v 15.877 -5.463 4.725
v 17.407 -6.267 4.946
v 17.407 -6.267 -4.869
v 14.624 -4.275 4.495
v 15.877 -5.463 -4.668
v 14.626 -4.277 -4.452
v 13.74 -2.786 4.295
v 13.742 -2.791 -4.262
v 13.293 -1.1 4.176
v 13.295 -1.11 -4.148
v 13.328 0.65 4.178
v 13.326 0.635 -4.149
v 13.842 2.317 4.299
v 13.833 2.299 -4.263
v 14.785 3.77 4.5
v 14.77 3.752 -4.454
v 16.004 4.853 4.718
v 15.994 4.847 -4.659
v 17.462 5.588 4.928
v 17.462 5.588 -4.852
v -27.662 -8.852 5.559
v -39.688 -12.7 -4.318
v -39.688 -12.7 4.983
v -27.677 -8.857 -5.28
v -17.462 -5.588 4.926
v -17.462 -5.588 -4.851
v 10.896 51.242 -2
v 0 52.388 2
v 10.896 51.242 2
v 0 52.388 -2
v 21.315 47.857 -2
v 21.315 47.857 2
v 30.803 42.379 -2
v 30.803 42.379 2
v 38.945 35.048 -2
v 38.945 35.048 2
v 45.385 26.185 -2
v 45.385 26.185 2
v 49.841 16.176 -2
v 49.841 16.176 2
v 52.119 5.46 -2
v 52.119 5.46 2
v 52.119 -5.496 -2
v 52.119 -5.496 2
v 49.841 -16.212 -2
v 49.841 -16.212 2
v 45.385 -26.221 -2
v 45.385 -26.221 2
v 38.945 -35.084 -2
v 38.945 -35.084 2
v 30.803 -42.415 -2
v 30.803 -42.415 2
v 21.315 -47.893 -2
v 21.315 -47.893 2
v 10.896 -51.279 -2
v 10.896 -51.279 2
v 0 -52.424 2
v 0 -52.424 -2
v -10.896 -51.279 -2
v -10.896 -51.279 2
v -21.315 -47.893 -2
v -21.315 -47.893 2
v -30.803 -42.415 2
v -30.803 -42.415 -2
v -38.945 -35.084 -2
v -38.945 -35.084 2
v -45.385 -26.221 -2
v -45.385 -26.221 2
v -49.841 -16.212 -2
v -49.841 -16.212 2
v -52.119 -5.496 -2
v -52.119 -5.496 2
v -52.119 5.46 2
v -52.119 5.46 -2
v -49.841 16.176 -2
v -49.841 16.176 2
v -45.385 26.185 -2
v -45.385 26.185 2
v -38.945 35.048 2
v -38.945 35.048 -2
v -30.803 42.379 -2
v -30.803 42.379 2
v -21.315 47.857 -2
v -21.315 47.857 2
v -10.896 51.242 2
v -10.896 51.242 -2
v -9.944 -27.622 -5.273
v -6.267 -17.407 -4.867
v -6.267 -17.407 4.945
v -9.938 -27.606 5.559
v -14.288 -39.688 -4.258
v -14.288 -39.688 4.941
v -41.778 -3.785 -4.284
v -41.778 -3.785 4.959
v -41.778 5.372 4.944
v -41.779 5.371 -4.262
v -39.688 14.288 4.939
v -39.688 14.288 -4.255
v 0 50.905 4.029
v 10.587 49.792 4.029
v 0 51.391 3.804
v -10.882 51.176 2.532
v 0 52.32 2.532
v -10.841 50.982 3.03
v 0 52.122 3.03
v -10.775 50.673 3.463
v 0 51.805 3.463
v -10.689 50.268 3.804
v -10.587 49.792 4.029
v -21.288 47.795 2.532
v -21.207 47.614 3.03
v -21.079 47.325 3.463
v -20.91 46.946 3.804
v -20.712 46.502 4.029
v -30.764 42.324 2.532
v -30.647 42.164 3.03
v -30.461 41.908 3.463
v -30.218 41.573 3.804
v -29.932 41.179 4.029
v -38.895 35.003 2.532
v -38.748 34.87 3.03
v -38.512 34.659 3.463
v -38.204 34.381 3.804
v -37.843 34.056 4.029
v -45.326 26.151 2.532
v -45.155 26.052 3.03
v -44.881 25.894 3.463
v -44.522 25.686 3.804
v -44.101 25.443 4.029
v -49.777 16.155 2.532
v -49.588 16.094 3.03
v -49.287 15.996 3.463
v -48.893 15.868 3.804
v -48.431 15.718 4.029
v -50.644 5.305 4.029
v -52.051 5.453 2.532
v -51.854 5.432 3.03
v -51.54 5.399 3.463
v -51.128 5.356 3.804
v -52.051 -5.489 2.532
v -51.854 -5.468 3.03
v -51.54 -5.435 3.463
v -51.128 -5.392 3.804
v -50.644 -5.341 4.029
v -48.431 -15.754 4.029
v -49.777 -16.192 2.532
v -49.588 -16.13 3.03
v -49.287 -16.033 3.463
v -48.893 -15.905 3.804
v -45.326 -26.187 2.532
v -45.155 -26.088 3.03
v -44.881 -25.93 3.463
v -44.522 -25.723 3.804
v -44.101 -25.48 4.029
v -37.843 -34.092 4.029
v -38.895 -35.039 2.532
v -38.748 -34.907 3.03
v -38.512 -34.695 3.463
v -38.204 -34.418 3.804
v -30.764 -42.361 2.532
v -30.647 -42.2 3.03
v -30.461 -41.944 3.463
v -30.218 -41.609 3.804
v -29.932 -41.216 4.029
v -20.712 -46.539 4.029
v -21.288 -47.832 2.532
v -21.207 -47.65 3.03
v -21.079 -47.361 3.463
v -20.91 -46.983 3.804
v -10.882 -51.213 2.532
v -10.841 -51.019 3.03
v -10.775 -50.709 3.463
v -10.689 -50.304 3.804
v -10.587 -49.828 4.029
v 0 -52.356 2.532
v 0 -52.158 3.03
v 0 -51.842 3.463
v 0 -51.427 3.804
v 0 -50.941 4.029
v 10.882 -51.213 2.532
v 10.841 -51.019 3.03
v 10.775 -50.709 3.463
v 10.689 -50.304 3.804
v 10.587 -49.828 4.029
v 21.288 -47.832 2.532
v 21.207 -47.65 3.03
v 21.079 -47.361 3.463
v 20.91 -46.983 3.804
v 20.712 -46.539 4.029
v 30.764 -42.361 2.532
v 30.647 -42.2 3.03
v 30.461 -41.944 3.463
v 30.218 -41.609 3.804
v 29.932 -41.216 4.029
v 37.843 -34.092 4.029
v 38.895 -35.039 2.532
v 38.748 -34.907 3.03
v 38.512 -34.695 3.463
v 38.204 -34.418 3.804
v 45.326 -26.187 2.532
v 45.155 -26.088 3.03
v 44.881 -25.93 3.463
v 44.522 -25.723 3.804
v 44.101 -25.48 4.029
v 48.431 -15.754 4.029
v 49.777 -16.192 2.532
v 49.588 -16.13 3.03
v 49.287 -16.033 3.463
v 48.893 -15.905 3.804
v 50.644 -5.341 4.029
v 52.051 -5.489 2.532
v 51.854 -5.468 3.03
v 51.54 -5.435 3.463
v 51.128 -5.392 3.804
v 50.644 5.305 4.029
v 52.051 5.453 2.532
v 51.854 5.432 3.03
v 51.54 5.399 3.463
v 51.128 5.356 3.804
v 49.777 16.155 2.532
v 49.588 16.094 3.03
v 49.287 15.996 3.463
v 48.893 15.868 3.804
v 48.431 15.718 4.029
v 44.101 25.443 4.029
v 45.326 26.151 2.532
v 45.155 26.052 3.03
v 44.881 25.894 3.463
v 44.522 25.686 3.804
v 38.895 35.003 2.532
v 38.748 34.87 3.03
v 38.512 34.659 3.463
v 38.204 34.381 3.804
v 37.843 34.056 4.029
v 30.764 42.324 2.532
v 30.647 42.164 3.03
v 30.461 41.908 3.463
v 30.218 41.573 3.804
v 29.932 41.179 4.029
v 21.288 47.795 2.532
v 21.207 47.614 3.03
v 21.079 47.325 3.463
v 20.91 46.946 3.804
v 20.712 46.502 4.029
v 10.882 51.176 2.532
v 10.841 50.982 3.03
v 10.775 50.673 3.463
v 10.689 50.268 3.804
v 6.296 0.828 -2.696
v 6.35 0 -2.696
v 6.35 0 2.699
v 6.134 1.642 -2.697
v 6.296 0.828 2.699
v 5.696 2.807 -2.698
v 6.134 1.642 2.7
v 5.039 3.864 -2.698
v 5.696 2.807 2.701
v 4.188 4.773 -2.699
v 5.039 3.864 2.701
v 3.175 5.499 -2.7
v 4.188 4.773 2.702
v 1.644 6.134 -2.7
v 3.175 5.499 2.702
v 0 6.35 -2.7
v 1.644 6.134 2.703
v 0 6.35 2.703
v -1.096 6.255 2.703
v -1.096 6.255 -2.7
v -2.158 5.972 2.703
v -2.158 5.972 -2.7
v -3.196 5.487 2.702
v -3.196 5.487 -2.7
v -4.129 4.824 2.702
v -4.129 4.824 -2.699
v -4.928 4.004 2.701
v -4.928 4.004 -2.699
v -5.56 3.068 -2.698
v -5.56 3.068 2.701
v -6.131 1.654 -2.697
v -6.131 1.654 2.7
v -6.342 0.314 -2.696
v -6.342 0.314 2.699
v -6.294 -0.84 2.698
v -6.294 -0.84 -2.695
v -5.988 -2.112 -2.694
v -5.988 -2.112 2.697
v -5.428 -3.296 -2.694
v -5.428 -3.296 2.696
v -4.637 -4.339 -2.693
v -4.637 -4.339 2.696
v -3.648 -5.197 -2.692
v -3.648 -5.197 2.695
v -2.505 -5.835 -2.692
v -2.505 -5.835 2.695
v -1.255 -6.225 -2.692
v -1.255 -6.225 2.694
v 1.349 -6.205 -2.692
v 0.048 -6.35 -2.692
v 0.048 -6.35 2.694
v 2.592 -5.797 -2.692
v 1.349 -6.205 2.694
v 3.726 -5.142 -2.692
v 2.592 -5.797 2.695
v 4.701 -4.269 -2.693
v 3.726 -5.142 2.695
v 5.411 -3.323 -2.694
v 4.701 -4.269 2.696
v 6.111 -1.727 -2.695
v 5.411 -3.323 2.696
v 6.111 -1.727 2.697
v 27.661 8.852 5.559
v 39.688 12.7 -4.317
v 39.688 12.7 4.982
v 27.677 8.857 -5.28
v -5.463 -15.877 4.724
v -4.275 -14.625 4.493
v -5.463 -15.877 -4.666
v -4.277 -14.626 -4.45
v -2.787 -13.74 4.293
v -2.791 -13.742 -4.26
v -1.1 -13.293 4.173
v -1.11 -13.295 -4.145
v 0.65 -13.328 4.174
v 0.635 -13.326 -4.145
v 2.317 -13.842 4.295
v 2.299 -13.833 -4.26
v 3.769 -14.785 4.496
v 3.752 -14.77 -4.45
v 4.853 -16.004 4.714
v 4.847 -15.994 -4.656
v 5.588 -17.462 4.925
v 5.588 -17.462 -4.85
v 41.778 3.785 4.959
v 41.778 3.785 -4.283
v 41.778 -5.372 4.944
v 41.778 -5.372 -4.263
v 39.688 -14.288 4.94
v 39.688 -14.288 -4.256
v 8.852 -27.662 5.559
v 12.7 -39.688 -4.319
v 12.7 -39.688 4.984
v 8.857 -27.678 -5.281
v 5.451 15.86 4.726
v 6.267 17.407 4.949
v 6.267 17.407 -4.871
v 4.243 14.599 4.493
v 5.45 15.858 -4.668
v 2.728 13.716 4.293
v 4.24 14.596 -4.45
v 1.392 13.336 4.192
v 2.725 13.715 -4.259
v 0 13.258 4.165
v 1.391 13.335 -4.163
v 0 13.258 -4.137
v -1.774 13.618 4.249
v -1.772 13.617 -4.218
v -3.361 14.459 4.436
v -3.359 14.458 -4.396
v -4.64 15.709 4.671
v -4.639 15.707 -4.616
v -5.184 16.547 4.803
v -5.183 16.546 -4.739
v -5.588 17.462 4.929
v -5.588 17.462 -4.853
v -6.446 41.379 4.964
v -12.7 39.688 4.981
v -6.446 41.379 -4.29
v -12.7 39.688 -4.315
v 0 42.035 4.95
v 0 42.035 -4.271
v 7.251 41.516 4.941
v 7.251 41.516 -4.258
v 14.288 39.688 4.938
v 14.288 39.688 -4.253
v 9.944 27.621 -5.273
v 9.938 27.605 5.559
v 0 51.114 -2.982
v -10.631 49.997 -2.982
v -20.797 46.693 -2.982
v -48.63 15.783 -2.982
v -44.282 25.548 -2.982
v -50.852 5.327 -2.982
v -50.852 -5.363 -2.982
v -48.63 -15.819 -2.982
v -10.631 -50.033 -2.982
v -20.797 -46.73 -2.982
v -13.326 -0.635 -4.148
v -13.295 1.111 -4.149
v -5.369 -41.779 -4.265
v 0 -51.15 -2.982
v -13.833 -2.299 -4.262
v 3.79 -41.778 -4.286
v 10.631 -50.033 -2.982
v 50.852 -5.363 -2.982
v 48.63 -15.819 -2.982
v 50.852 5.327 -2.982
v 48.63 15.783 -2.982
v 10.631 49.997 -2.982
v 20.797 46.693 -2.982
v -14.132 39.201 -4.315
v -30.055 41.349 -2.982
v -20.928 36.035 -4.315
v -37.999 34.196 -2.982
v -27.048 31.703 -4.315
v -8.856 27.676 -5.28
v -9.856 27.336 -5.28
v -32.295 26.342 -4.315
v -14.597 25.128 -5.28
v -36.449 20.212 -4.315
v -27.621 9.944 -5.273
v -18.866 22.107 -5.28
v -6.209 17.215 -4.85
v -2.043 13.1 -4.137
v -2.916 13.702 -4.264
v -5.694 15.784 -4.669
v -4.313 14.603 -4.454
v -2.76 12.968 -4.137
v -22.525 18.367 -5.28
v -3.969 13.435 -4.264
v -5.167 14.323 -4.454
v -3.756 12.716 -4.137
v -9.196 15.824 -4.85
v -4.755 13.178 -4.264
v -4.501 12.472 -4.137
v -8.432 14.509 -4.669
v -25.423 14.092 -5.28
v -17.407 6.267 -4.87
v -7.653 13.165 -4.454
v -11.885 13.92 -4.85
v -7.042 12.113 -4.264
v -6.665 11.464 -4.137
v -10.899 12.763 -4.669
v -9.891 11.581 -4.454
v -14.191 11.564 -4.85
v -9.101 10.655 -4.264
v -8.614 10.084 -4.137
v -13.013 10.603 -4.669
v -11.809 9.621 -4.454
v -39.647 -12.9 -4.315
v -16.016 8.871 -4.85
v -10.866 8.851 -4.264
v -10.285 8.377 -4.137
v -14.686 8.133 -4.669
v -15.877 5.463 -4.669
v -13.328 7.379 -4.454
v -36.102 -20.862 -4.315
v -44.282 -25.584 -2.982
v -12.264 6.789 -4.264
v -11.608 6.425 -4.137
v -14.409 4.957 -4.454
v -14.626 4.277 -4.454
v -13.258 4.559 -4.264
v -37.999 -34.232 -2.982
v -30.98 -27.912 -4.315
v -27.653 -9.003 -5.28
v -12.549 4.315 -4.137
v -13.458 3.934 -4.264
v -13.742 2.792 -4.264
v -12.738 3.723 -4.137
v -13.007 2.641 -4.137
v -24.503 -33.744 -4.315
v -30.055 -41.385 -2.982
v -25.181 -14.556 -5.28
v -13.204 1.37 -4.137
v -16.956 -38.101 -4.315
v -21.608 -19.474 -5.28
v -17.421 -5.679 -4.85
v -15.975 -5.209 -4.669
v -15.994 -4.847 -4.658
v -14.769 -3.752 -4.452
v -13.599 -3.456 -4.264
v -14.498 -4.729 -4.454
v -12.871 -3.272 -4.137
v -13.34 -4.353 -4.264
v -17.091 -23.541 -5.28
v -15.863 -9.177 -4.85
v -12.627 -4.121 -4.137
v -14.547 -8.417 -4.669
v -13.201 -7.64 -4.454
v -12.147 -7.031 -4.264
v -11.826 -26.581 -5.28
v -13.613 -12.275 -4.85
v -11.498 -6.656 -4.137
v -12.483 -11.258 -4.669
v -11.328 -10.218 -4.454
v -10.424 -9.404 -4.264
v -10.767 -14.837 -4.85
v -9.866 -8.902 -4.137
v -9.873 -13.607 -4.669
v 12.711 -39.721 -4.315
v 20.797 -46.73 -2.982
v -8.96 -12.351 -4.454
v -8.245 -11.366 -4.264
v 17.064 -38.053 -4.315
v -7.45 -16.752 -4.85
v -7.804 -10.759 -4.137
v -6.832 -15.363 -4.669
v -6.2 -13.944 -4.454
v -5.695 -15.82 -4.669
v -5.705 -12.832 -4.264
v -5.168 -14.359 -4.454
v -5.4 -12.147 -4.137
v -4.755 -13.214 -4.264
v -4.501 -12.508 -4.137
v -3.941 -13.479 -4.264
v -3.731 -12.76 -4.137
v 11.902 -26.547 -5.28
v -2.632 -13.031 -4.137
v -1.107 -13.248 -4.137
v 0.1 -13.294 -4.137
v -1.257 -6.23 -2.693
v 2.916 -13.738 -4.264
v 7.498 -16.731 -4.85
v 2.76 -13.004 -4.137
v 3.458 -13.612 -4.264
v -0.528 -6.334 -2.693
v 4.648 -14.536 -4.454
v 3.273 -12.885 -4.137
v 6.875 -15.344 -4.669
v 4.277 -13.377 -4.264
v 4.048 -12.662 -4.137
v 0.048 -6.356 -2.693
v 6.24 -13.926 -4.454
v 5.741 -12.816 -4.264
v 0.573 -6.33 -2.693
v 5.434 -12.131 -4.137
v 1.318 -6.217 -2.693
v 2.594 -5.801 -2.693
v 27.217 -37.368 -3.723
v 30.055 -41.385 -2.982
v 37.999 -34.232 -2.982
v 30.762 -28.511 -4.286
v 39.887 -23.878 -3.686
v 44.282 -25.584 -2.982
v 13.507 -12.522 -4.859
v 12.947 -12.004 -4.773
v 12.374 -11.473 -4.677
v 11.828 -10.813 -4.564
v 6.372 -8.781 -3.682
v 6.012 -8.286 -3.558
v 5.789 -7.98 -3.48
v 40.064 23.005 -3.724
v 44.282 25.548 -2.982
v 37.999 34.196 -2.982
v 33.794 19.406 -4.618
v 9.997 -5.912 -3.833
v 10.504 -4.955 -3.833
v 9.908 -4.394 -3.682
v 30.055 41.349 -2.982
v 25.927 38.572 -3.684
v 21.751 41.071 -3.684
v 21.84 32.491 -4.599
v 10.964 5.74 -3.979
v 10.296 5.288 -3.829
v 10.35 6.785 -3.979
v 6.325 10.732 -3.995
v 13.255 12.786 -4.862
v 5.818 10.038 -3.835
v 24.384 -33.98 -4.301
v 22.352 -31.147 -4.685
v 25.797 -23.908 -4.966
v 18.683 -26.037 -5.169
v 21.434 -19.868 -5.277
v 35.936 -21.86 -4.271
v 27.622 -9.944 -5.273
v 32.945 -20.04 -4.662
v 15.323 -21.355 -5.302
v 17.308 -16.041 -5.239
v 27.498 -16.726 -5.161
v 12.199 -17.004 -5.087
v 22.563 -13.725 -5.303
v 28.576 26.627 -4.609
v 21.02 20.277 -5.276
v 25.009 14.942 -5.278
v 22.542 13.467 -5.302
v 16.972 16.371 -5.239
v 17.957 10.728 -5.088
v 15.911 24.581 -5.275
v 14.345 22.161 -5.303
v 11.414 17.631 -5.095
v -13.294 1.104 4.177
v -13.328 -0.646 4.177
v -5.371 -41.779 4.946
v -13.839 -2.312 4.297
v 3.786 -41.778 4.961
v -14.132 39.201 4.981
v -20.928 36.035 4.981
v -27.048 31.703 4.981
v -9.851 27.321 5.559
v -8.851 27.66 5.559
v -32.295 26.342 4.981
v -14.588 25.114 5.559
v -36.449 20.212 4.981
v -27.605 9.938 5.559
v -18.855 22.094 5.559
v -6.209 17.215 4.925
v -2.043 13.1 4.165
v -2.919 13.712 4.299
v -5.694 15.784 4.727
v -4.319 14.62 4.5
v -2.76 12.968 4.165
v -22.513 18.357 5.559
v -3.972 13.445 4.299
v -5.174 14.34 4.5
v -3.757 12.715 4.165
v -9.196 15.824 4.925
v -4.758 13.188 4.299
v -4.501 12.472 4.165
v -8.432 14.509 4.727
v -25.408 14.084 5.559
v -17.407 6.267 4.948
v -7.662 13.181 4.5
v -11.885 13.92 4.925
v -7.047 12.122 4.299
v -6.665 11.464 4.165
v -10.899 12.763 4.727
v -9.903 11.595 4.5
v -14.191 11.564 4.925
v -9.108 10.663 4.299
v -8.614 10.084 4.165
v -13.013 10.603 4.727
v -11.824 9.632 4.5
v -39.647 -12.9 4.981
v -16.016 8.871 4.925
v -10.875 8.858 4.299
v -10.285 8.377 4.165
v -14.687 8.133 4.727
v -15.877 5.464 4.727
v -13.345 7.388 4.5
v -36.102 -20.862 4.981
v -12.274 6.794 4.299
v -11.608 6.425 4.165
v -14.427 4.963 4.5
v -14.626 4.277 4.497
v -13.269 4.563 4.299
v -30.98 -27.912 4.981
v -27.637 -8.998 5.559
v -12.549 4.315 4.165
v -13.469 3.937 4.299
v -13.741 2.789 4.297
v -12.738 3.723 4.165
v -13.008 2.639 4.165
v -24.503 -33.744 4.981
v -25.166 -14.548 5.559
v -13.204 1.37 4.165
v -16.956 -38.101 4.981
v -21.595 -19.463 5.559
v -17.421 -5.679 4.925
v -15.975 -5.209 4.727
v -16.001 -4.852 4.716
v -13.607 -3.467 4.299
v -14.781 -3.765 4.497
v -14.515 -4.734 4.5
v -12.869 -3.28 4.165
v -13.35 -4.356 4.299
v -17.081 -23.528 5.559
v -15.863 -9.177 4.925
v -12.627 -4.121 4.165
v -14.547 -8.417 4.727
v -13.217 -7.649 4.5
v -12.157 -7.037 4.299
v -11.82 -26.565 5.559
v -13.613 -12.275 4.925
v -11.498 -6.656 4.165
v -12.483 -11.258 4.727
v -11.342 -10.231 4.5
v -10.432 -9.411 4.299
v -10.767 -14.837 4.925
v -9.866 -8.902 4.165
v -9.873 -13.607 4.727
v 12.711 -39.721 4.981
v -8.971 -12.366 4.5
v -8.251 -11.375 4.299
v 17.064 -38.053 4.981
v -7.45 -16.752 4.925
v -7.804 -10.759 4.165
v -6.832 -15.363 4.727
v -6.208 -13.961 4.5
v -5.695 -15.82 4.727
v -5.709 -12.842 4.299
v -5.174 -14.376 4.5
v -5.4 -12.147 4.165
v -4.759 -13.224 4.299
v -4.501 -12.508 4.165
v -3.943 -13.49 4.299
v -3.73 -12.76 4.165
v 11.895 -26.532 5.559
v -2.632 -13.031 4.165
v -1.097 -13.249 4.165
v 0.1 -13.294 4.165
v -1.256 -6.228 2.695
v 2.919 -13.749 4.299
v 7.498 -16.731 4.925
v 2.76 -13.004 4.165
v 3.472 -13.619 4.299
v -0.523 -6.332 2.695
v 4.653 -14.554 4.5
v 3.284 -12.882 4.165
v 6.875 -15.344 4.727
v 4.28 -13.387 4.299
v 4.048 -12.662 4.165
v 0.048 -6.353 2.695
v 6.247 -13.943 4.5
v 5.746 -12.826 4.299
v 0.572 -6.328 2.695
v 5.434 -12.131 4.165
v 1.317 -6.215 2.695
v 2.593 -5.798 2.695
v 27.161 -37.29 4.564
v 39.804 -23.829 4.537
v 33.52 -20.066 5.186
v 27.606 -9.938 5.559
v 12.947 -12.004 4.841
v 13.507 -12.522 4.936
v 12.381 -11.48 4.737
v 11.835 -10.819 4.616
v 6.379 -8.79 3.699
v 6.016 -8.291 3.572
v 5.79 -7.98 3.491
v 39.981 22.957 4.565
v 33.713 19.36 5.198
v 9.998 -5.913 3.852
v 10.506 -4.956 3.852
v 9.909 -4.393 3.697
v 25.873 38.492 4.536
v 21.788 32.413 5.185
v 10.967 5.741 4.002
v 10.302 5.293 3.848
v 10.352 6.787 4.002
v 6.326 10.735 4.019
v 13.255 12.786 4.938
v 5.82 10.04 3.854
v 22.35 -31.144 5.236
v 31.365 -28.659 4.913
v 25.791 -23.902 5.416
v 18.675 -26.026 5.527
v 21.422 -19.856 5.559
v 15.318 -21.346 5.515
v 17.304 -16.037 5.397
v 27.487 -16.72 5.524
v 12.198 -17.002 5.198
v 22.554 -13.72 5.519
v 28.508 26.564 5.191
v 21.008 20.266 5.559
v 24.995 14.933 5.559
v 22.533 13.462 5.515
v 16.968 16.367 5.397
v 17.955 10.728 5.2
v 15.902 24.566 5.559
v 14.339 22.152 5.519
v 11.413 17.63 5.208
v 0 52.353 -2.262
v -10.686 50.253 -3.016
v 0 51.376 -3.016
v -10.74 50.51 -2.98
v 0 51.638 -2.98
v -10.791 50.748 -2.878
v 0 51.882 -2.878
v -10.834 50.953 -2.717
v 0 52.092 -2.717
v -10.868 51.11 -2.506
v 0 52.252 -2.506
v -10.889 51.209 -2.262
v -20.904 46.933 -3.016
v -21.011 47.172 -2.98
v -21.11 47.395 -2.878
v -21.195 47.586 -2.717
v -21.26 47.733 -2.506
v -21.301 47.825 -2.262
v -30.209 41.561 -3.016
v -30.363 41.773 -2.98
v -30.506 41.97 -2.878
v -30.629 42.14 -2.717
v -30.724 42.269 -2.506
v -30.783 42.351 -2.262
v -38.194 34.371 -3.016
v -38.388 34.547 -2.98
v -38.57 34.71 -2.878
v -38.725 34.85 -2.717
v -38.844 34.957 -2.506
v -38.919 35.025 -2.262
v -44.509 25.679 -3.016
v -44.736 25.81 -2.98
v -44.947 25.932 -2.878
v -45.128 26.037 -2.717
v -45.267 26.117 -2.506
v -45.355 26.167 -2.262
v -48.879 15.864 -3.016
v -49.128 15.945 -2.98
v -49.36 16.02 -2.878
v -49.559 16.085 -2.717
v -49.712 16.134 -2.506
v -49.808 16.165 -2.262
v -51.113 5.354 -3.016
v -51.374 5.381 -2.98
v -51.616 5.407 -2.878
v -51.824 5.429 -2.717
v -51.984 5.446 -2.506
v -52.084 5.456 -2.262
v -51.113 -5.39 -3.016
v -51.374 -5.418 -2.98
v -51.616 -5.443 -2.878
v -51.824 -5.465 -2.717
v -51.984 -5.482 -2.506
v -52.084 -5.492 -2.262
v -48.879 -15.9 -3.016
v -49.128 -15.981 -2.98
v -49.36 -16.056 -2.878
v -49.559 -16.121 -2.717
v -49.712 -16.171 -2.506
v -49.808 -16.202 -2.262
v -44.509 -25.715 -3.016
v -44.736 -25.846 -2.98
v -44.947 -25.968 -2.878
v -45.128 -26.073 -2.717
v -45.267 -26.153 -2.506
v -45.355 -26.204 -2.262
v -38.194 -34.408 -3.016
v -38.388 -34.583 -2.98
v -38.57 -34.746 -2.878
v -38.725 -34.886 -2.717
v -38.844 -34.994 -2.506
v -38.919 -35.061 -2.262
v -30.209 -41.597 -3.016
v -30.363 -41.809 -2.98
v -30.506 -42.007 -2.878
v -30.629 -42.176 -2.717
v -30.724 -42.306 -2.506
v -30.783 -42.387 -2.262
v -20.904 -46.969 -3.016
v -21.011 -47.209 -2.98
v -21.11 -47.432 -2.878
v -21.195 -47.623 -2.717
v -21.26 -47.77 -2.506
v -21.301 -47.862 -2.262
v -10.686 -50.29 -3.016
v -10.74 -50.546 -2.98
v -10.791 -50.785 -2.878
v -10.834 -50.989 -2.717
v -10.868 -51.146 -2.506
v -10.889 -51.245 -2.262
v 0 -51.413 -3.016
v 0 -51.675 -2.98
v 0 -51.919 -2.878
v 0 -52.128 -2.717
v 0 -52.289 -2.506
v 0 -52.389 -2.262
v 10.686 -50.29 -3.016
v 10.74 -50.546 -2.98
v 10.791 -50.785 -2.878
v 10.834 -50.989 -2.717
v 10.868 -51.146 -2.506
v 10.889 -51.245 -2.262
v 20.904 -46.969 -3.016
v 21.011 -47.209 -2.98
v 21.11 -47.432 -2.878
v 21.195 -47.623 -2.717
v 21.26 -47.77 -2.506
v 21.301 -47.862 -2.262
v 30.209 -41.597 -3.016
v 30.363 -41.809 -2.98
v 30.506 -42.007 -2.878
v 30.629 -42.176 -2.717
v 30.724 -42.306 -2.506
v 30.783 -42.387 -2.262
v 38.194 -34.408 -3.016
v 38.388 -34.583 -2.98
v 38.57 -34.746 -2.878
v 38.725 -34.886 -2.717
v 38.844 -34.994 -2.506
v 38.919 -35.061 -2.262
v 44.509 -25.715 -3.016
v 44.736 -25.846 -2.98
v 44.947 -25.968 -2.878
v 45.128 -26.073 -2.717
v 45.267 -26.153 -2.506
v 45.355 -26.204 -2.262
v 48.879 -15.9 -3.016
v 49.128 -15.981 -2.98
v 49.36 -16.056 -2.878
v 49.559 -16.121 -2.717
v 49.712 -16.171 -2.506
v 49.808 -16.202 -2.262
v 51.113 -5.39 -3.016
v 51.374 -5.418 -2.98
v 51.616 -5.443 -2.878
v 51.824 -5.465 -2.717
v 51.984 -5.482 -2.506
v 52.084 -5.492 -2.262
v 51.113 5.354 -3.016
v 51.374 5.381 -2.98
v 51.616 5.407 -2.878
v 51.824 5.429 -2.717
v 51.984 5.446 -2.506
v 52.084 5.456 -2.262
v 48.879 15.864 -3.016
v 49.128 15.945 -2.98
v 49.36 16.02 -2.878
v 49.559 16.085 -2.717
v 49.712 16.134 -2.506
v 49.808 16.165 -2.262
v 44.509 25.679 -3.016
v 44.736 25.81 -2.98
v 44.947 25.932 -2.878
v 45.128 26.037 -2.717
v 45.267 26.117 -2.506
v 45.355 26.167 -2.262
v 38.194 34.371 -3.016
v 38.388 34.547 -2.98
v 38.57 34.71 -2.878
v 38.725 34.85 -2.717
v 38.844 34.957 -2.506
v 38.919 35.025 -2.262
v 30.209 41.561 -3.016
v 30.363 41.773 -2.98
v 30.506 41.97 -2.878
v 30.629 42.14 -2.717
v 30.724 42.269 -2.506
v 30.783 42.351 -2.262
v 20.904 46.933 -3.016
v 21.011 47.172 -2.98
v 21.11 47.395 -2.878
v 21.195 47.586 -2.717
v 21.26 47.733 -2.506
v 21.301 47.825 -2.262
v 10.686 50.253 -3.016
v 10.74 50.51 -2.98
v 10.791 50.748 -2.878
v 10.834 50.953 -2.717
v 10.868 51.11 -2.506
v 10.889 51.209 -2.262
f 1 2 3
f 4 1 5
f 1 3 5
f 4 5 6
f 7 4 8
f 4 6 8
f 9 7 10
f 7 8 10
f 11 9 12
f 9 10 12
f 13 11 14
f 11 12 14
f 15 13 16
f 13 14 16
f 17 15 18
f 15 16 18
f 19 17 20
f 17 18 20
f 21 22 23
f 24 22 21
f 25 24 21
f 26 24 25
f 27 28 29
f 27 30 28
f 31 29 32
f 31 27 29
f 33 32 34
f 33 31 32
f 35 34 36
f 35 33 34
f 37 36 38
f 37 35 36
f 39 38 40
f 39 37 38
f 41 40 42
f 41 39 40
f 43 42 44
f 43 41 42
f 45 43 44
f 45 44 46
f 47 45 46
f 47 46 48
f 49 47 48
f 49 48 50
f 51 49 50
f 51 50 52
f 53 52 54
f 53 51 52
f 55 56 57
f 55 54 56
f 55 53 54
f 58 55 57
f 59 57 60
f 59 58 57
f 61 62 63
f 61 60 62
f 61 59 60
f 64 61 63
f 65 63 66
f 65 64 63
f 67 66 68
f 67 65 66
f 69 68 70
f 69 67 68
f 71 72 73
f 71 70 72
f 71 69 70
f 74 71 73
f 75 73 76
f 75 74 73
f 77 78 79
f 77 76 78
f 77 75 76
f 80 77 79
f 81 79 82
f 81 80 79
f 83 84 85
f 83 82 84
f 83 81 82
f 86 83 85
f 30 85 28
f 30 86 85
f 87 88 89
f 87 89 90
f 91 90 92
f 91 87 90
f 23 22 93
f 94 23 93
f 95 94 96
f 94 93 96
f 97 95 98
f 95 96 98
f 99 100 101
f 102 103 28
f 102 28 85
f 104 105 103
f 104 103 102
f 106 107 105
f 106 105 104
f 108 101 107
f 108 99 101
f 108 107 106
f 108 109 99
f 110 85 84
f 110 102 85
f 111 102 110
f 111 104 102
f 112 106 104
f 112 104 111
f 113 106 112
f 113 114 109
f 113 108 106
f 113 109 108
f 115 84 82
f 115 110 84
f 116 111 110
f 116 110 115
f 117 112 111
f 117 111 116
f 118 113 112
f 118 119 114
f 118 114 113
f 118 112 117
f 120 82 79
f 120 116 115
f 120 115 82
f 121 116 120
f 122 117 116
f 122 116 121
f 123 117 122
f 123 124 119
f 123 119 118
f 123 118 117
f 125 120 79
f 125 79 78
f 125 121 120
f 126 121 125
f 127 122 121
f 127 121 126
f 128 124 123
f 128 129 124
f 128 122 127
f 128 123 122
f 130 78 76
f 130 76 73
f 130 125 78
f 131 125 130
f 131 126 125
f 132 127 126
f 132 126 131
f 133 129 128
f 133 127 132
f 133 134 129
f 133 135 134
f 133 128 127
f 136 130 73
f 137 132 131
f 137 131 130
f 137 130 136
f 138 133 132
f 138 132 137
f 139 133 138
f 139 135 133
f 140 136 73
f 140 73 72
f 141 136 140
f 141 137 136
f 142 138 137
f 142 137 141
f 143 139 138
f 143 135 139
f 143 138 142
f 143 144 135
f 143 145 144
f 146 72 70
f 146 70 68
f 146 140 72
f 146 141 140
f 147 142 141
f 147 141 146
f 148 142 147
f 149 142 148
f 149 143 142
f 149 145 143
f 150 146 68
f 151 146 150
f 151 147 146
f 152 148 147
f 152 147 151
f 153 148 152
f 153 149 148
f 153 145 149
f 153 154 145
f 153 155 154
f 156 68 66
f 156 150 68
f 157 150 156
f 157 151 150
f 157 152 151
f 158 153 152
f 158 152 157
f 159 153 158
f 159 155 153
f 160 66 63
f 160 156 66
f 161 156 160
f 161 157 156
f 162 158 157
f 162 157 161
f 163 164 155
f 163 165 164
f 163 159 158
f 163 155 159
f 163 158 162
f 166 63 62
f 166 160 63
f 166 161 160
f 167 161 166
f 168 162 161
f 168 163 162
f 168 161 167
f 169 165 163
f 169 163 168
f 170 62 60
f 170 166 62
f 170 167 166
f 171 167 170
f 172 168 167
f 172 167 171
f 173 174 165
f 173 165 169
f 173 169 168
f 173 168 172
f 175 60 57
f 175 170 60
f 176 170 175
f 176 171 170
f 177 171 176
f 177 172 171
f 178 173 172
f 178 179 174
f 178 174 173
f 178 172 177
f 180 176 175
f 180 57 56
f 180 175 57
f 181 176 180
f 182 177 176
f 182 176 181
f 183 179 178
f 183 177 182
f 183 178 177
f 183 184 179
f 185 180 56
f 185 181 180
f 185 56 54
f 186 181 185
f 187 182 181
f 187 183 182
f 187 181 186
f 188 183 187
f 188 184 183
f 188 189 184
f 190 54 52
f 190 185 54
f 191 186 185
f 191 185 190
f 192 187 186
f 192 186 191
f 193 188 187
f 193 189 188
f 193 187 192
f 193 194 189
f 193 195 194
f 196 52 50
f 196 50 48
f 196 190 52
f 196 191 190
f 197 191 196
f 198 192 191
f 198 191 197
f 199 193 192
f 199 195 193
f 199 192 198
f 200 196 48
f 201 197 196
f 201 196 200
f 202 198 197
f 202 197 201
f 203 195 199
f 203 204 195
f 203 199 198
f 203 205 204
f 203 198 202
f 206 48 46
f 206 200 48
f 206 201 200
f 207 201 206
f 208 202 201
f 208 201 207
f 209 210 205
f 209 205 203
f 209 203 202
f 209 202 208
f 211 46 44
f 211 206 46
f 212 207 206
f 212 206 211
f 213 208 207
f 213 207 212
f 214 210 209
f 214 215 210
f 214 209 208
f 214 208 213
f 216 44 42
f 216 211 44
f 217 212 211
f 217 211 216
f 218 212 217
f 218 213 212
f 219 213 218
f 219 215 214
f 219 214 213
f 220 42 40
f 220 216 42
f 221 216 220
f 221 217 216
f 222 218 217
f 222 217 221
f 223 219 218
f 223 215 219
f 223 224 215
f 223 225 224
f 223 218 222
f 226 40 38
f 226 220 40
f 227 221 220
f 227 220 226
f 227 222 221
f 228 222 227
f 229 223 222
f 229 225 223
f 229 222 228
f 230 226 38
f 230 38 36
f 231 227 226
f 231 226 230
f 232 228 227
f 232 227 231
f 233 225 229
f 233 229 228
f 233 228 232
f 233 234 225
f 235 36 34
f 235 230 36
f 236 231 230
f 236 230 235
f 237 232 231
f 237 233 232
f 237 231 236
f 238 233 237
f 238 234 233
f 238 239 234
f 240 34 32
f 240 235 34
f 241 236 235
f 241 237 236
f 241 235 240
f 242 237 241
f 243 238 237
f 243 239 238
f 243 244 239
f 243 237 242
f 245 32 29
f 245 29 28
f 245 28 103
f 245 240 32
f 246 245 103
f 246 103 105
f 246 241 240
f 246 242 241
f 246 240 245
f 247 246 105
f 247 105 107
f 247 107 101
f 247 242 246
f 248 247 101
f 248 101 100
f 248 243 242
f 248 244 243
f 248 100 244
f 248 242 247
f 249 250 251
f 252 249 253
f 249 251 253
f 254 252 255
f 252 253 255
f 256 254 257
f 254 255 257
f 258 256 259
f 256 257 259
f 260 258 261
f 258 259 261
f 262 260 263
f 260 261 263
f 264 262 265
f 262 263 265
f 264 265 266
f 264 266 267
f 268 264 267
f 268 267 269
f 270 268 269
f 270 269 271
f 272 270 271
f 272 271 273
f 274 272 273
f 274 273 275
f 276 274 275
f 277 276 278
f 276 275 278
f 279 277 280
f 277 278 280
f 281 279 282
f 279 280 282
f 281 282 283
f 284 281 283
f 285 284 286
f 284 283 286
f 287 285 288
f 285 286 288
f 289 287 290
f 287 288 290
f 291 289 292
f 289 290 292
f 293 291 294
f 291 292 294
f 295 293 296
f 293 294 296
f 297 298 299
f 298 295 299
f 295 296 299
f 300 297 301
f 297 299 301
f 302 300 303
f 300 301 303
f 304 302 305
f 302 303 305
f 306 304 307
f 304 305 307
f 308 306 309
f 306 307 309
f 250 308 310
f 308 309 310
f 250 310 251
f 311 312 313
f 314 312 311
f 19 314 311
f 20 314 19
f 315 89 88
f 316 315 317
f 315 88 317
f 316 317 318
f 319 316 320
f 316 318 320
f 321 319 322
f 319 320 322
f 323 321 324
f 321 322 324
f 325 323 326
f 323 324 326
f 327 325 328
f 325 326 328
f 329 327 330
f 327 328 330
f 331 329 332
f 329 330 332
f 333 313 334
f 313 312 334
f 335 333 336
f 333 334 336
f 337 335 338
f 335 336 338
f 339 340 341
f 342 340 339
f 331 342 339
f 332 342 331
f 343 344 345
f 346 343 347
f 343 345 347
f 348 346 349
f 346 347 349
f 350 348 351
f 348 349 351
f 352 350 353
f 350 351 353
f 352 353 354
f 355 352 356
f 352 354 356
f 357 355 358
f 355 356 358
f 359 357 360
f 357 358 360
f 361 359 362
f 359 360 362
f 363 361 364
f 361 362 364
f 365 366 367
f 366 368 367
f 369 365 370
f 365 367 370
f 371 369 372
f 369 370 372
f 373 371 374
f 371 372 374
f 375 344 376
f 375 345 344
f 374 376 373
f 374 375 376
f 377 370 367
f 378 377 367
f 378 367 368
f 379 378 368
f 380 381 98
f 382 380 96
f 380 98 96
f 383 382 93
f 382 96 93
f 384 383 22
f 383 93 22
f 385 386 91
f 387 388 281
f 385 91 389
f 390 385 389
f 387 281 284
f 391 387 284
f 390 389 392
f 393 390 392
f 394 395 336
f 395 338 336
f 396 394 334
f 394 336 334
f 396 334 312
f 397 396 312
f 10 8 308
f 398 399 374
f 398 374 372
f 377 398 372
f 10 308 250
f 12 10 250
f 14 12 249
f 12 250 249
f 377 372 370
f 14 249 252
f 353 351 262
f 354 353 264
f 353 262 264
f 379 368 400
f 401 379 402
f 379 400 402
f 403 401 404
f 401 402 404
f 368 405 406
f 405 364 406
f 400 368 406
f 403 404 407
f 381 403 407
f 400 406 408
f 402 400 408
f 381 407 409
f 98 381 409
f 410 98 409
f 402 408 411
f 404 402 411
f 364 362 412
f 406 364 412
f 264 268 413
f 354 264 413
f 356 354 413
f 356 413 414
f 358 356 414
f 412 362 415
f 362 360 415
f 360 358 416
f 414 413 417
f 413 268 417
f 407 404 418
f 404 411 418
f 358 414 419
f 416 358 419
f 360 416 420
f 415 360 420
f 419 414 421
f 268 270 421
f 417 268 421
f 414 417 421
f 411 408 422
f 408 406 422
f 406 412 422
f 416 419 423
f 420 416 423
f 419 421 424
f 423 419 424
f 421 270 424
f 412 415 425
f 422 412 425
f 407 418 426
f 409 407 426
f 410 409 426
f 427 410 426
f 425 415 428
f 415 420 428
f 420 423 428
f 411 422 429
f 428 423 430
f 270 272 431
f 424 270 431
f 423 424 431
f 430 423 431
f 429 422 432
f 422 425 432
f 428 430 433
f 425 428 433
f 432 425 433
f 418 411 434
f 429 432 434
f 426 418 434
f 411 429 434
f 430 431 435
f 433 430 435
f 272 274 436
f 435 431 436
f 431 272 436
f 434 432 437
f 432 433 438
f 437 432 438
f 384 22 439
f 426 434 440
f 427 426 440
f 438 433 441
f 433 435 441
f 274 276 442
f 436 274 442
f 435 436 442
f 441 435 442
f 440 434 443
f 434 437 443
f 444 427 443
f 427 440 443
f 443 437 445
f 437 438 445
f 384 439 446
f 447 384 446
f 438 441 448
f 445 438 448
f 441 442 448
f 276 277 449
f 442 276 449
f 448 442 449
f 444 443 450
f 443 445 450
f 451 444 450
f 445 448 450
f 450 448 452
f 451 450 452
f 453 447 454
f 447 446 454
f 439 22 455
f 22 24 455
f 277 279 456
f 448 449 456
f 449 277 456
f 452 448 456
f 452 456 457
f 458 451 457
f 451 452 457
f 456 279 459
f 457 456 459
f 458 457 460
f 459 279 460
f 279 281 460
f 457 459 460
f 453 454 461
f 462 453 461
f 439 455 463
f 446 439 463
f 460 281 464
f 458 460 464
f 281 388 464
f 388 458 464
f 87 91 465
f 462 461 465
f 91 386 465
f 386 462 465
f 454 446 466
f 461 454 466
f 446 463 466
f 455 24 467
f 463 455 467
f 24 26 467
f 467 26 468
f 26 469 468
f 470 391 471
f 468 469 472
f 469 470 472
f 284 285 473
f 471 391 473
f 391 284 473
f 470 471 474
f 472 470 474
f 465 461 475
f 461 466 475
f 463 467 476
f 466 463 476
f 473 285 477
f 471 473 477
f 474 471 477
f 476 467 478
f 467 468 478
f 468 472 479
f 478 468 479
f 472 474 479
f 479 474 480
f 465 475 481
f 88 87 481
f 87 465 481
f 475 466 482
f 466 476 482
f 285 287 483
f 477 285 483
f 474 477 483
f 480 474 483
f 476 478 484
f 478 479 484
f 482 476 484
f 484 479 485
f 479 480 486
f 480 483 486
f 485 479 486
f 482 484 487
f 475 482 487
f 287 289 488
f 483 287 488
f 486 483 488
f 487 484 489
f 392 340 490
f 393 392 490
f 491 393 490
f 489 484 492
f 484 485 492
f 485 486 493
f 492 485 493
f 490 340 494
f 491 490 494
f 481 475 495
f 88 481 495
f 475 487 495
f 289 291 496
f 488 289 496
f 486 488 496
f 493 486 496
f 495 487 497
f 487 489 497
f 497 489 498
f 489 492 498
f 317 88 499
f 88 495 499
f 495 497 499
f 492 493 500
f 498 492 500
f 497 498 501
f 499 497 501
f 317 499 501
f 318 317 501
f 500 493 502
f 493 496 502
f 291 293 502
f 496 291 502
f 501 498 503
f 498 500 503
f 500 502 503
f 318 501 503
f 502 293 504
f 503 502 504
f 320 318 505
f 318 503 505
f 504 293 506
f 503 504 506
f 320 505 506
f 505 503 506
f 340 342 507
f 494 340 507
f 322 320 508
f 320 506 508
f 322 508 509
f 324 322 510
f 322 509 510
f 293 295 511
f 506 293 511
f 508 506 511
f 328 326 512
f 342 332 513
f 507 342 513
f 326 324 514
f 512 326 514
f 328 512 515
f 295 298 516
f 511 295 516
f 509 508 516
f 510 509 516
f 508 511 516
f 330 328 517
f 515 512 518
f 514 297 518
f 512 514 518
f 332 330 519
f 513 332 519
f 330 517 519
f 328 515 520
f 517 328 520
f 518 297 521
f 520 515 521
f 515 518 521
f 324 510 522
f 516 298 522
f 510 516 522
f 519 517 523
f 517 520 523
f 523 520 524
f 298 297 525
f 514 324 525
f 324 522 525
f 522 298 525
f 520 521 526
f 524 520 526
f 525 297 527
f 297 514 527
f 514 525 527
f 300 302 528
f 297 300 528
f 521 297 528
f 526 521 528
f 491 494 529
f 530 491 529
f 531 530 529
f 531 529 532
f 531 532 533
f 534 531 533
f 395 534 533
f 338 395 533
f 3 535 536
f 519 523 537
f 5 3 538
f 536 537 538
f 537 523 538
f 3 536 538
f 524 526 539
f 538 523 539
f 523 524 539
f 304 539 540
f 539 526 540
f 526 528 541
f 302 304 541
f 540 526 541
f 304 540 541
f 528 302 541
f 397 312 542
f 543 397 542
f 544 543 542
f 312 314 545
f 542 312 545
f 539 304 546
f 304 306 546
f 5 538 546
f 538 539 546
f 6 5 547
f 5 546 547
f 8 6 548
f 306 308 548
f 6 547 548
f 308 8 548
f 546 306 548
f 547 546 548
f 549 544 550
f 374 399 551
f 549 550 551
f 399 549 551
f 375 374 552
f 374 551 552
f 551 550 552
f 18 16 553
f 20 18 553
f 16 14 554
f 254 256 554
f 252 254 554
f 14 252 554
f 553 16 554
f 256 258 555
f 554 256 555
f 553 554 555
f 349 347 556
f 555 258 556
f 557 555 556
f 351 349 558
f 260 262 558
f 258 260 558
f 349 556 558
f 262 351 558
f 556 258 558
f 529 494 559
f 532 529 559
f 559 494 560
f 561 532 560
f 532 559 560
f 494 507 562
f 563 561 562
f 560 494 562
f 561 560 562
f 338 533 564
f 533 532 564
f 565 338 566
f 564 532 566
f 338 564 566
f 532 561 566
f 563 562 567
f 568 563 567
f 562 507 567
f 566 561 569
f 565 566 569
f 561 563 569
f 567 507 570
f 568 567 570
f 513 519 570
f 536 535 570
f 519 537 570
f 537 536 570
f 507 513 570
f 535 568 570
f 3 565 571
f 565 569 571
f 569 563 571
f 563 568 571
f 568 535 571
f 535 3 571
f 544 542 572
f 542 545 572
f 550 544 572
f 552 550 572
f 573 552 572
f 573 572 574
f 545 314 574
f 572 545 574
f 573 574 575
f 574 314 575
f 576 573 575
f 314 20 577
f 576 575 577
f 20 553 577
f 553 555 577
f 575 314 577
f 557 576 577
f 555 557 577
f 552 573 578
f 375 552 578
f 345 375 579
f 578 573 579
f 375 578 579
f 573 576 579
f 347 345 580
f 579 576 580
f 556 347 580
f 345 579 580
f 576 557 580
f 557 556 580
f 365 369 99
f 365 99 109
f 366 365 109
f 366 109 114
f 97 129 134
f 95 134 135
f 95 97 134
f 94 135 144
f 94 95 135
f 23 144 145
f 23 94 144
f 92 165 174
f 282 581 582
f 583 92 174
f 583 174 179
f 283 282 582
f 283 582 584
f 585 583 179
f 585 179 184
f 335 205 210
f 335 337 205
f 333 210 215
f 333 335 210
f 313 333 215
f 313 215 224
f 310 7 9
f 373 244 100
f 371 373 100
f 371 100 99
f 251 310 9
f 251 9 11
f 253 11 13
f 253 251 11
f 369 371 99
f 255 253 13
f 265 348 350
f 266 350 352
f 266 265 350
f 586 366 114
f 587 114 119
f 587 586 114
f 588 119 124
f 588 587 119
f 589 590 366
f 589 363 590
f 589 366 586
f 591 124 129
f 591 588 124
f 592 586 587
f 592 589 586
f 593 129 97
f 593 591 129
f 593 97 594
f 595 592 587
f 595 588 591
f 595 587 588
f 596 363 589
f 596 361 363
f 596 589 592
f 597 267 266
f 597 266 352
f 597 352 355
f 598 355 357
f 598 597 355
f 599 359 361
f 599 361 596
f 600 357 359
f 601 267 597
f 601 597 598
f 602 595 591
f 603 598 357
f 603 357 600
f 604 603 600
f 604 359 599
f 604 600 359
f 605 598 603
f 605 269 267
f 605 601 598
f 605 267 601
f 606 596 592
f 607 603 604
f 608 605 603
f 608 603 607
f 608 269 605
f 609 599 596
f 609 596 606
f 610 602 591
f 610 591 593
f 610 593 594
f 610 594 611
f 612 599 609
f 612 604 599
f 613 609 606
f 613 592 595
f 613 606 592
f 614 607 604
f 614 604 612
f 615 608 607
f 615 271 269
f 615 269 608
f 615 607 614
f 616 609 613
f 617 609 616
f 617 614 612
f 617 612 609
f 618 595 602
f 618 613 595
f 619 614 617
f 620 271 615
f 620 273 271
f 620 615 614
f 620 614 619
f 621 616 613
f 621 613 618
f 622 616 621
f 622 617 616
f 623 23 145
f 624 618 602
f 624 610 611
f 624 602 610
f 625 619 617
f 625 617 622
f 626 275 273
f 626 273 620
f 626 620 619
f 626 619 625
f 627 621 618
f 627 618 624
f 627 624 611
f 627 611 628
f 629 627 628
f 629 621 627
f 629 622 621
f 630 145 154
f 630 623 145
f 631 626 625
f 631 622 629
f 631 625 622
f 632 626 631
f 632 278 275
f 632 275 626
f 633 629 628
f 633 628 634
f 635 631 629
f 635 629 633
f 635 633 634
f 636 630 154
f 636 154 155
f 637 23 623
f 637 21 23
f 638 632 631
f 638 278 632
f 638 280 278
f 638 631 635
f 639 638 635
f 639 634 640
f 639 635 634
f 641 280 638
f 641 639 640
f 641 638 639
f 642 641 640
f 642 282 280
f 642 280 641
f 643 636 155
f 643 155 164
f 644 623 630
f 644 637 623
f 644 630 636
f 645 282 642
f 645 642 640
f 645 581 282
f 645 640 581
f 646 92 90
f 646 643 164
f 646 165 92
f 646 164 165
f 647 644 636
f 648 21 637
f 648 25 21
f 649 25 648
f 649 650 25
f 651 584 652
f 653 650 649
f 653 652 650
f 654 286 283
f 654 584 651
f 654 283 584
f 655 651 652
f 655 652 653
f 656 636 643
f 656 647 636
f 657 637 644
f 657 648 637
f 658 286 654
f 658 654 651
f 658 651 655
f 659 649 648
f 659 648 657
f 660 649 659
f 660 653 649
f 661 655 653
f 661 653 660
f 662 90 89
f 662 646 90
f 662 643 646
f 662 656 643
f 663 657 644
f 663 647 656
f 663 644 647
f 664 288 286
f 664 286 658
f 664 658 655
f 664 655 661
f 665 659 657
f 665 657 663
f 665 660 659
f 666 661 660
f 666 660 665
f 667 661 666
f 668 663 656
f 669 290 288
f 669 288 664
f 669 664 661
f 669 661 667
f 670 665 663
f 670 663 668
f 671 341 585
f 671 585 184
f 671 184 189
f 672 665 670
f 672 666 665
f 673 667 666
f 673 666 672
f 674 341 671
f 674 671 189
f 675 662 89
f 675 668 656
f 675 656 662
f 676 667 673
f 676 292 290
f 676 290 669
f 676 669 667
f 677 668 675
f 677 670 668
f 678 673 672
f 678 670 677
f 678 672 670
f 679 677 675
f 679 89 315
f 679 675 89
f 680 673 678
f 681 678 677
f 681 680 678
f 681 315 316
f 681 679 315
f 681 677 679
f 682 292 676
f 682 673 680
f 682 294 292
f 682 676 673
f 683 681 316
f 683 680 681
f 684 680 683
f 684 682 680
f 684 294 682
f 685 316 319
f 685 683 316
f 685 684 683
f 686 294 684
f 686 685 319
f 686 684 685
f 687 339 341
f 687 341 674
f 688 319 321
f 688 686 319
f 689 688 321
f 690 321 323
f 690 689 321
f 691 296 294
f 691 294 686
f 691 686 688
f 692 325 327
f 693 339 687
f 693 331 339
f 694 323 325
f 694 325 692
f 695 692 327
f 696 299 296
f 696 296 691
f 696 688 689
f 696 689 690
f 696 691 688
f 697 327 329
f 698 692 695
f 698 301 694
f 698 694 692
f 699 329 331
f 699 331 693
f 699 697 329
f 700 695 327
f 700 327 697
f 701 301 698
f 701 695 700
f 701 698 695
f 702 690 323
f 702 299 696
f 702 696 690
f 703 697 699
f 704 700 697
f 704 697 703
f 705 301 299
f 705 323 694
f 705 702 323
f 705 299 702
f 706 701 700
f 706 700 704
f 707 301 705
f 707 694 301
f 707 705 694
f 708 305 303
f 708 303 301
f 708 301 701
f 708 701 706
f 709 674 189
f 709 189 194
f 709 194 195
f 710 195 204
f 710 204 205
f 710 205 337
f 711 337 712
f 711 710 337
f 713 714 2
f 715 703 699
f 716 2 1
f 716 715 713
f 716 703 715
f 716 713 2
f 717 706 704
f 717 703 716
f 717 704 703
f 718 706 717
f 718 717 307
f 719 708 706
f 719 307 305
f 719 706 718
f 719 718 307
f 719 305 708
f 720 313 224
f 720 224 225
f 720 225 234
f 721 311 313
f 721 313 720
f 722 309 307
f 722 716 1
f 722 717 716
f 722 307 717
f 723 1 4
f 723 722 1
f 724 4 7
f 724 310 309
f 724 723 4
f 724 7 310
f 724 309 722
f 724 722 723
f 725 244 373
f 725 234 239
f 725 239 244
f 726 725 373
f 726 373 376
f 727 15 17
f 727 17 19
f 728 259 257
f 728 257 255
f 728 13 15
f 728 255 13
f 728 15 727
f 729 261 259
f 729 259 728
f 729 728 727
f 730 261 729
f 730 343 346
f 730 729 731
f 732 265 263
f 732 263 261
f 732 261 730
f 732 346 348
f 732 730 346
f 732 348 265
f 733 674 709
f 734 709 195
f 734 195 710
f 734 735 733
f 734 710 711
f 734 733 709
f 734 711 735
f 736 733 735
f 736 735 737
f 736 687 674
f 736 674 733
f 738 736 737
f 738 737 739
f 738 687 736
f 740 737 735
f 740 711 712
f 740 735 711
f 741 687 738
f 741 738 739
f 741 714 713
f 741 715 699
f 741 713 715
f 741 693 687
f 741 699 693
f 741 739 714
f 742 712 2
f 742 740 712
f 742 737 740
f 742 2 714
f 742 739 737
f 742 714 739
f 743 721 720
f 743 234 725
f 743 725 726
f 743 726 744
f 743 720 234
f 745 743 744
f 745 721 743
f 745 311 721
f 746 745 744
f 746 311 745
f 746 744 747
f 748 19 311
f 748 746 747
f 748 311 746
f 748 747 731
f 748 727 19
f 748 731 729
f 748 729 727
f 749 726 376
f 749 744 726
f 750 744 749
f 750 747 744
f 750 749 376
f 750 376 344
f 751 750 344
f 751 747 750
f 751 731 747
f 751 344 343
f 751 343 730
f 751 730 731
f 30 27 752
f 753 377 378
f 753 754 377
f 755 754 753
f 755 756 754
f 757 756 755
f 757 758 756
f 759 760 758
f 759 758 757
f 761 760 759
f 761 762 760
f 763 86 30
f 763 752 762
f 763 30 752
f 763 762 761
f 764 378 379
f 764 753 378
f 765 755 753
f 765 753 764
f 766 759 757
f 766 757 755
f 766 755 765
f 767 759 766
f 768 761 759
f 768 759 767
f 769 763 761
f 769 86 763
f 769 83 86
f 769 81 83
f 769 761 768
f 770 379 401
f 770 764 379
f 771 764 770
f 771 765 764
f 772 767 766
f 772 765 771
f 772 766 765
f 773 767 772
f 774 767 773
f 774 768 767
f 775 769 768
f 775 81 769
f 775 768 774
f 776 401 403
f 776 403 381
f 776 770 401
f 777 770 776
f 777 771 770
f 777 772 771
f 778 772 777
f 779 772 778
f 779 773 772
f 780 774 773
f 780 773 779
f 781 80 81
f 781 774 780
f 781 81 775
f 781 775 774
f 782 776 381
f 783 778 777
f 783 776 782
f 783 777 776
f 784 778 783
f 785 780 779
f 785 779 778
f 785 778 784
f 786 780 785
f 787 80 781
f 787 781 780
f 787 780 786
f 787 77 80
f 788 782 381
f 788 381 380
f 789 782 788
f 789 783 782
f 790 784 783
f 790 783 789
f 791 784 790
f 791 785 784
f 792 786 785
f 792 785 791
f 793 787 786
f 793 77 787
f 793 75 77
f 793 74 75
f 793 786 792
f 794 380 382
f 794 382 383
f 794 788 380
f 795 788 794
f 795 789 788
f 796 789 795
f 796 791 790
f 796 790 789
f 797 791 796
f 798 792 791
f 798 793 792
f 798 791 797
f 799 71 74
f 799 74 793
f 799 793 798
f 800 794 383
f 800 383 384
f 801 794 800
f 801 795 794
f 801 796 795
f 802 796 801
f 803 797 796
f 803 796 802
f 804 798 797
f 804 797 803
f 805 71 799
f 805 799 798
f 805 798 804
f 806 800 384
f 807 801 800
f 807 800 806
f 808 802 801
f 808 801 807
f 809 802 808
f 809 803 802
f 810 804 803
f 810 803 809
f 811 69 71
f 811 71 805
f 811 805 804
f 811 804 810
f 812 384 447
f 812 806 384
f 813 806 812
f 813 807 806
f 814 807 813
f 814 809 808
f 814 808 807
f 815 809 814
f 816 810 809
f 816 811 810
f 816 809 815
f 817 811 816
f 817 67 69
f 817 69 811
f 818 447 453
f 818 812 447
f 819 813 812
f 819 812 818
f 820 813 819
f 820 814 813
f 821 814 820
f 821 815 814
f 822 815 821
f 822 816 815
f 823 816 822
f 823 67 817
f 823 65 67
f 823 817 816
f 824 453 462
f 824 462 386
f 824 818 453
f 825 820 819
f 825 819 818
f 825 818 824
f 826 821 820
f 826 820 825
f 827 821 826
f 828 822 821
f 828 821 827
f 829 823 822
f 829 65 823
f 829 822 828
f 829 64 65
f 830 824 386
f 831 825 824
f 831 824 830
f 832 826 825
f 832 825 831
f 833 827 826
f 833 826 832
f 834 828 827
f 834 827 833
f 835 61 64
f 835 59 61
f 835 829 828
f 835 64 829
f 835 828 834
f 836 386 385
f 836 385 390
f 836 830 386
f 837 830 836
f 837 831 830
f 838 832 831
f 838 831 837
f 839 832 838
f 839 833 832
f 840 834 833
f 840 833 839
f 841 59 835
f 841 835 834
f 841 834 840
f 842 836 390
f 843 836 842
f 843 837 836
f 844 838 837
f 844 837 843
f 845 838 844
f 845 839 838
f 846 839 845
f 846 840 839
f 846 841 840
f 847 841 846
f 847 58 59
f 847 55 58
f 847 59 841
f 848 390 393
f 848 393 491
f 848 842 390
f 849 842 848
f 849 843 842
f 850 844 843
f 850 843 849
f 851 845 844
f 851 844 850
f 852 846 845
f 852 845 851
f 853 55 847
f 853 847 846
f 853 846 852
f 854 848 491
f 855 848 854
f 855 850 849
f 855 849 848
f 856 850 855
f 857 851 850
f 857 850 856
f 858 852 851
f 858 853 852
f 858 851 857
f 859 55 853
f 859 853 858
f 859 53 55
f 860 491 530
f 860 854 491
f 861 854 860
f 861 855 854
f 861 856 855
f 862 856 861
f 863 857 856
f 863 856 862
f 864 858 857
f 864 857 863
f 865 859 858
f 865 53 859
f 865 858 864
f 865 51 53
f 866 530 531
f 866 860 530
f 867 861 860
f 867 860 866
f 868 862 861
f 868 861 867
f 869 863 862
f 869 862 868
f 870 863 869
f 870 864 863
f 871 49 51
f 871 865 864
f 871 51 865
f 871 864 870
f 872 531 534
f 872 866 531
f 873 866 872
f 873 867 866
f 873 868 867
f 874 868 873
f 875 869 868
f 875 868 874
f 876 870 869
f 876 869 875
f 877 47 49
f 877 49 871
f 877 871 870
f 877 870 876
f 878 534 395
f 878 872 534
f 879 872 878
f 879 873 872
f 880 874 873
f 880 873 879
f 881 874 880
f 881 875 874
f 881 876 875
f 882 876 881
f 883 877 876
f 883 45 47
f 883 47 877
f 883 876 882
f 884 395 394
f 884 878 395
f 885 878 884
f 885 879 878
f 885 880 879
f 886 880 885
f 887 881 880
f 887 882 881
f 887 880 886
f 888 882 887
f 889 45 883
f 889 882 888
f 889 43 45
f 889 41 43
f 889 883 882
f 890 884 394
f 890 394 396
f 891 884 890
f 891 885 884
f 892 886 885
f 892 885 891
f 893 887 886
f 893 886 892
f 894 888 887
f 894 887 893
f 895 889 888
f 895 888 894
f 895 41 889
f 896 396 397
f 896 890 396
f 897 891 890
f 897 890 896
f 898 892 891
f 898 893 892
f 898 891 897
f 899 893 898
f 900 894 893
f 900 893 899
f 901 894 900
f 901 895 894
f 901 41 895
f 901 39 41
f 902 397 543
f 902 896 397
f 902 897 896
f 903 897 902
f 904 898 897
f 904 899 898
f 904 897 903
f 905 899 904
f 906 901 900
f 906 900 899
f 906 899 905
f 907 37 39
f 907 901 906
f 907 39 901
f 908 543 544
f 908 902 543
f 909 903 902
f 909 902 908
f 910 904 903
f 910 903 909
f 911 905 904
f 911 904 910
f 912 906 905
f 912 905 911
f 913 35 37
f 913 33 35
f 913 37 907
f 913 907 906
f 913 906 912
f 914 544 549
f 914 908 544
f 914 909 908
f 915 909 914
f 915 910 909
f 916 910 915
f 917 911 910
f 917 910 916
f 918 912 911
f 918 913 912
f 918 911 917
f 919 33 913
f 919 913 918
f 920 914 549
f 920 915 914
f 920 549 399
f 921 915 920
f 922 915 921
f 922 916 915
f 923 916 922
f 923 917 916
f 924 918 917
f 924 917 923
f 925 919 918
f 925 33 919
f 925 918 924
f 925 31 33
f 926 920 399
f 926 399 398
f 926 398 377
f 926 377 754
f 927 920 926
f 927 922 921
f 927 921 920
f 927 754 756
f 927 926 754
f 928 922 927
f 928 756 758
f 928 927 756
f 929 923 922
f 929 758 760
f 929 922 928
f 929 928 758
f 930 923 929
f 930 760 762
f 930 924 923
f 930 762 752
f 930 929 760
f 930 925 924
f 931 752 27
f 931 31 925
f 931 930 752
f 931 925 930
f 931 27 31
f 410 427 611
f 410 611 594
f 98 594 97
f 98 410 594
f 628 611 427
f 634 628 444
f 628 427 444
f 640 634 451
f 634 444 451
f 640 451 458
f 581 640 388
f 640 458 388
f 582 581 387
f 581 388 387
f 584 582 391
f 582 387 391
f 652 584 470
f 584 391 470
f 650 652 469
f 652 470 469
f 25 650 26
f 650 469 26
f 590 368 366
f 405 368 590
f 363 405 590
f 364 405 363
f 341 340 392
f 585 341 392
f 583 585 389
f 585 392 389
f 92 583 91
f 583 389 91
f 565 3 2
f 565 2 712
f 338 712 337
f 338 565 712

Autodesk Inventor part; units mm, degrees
ref_plane "YZ Plane" through (0, 0, 0) normal (1, 0, 0) x (0, 1, 0)
ref_plane "XZ Plane" through (0, 0, 0) normal (0, 1, 0) x (-1, 0, 0)
ref_plane "XY Plane" through (0, 0, 0) normal (0, 0, 1) x (1, 0, 0)
sketch "Sketch1" plane through (0, 0, 0) normal (1, 0, 0) x (0, 1, 0)
  line L0 (52.3875, 0) -> (52.3875, 2)
  line L1 (52.3875, 0) -> (52.3875, -2)
  arc A0 (52.3875, 2) -> (50.9047, 4.0295) centre (50.2572, 2) ccw
  arc A1 (51.1141, -2.9824) -> (52.3875, -2) centre (51.3718, -2) ccw
  line L2 (50.9047, 4.0295) -> (25.8188, 7.012) construction
  line L3 (25.8188, 7.012) -> (16.2938, 5.4245) construction
  line L4 (16.2938, 5.4245) -> (-0.0182, 1.08) construction
  spline S0 degree 3 poles (50.9047, 4.0295) (25.8188, 7.012) (16.2938, 5.4245) (-0.0182, 1.08) knots 1 1 1 1 2 2 2 2
  line L5 (0, 0) -> (52.3875, 0)
  line L6 (51.1141, -2.9824) -> (25.8188, -7.012) construction
  line L7 (25.8188, -7.012) -> (16.2938, -5.4245) construction
  line L8 (16.2938, -5.4245) -> (-0.0182, -1.08) construction
  spline S1 degree 3 poles (51.1141, -2.9824) (25.8188, -7.012) (16.2938, -5.4245) (-0.0182, -1.08) knots 1 1 1 1 2 2 2 2
  line L9 (-0.0182, -1.08) -> (-0.0182, 1.08)
  dimension "d0" = 2
  dimension "d1" = 2
revolve "Revolution1" add sketch "Sketch1" angle 360 about axis through (0, -0.0182, -1.08) along (0, 0, 1)
sketch "Sketch2" plane through (0, 0, 0) normal (0, 0, 1) x (1, 0, 0)
  circle A0 centre (0, 0) radius 6.35
extrude "Extrusion1" cut sketch "Sketch2" along normal mid plane 105.25
sketch "Sketch3" plane through (0, 0, 0) normal (0, 0, 1) x (1, 0, 0)
  line L0 (0, 0) -> (-14.2875, -39.6875)
  arc A0 (-14.2875, -39.6875) -> (12.7, -39.6875) centre (-0.7937, -2.2049) ccw
  line L1 (12.7, -39.6875) -> (0, 0)
  line L2 (0, 0) -> (-6.2667, -17.4074)
  line L3 (5.588, -17.4625) -> (0, 0)
  arc A1 (5.588, -17.4625) -> (-6.2667, -17.4074) centre (-0.3491, -19.5378) ccw
  line L4 (39.6875, 12.7) -> (0, 0)
  arc A2 (39.6875, -14.2875) -> (39.6875, 12.7) centre (2.2049, -0.7937) ccw
  line L5 (0, 0) -> (39.6875, -14.2875)
  arc A3 (17.4625, 5.588) -> (17.4074, -6.2667) centre (19.5378, -0.3491) ccw
  line L6 (-12.7, 39.6875) -> (0, 0)
  arc A4 (14.2875, 39.6875) -> (-12.7, 39.6875) centre (0.7937, 2.2049) ccw
  line L7 (0, 0) -> (14.2875, 39.6875)
  arc A5 (-5.588, 17.4625) -> (6.2667, 17.4074) centre (0.3491, 19.5378) ccw
  line L8 (-39.6875, -12.7) -> (0, 0)
  arc A6 (-39.6875, 14.2875) -> (-39.6875, -12.7) centre (-2.2049, 0.7938) ccw
  line L9 (0, 0) -> (-39.6875, 14.2875)
  arc A7 (-17.4625, -5.588) -> (-17.4074, 6.2667) centre (-19.5378, 0.3491) ccw
  dimension "d13" = 360
extrude "Extrusion3" cut sketch "Sketch3" along normal mid plane 105.25 contours A1 L1 A0 L0 | L4 A2 L5 A3 | L6 A4 L7 A5 | L8 A6 L9 A7
properties part number "Anti tip wheels"
